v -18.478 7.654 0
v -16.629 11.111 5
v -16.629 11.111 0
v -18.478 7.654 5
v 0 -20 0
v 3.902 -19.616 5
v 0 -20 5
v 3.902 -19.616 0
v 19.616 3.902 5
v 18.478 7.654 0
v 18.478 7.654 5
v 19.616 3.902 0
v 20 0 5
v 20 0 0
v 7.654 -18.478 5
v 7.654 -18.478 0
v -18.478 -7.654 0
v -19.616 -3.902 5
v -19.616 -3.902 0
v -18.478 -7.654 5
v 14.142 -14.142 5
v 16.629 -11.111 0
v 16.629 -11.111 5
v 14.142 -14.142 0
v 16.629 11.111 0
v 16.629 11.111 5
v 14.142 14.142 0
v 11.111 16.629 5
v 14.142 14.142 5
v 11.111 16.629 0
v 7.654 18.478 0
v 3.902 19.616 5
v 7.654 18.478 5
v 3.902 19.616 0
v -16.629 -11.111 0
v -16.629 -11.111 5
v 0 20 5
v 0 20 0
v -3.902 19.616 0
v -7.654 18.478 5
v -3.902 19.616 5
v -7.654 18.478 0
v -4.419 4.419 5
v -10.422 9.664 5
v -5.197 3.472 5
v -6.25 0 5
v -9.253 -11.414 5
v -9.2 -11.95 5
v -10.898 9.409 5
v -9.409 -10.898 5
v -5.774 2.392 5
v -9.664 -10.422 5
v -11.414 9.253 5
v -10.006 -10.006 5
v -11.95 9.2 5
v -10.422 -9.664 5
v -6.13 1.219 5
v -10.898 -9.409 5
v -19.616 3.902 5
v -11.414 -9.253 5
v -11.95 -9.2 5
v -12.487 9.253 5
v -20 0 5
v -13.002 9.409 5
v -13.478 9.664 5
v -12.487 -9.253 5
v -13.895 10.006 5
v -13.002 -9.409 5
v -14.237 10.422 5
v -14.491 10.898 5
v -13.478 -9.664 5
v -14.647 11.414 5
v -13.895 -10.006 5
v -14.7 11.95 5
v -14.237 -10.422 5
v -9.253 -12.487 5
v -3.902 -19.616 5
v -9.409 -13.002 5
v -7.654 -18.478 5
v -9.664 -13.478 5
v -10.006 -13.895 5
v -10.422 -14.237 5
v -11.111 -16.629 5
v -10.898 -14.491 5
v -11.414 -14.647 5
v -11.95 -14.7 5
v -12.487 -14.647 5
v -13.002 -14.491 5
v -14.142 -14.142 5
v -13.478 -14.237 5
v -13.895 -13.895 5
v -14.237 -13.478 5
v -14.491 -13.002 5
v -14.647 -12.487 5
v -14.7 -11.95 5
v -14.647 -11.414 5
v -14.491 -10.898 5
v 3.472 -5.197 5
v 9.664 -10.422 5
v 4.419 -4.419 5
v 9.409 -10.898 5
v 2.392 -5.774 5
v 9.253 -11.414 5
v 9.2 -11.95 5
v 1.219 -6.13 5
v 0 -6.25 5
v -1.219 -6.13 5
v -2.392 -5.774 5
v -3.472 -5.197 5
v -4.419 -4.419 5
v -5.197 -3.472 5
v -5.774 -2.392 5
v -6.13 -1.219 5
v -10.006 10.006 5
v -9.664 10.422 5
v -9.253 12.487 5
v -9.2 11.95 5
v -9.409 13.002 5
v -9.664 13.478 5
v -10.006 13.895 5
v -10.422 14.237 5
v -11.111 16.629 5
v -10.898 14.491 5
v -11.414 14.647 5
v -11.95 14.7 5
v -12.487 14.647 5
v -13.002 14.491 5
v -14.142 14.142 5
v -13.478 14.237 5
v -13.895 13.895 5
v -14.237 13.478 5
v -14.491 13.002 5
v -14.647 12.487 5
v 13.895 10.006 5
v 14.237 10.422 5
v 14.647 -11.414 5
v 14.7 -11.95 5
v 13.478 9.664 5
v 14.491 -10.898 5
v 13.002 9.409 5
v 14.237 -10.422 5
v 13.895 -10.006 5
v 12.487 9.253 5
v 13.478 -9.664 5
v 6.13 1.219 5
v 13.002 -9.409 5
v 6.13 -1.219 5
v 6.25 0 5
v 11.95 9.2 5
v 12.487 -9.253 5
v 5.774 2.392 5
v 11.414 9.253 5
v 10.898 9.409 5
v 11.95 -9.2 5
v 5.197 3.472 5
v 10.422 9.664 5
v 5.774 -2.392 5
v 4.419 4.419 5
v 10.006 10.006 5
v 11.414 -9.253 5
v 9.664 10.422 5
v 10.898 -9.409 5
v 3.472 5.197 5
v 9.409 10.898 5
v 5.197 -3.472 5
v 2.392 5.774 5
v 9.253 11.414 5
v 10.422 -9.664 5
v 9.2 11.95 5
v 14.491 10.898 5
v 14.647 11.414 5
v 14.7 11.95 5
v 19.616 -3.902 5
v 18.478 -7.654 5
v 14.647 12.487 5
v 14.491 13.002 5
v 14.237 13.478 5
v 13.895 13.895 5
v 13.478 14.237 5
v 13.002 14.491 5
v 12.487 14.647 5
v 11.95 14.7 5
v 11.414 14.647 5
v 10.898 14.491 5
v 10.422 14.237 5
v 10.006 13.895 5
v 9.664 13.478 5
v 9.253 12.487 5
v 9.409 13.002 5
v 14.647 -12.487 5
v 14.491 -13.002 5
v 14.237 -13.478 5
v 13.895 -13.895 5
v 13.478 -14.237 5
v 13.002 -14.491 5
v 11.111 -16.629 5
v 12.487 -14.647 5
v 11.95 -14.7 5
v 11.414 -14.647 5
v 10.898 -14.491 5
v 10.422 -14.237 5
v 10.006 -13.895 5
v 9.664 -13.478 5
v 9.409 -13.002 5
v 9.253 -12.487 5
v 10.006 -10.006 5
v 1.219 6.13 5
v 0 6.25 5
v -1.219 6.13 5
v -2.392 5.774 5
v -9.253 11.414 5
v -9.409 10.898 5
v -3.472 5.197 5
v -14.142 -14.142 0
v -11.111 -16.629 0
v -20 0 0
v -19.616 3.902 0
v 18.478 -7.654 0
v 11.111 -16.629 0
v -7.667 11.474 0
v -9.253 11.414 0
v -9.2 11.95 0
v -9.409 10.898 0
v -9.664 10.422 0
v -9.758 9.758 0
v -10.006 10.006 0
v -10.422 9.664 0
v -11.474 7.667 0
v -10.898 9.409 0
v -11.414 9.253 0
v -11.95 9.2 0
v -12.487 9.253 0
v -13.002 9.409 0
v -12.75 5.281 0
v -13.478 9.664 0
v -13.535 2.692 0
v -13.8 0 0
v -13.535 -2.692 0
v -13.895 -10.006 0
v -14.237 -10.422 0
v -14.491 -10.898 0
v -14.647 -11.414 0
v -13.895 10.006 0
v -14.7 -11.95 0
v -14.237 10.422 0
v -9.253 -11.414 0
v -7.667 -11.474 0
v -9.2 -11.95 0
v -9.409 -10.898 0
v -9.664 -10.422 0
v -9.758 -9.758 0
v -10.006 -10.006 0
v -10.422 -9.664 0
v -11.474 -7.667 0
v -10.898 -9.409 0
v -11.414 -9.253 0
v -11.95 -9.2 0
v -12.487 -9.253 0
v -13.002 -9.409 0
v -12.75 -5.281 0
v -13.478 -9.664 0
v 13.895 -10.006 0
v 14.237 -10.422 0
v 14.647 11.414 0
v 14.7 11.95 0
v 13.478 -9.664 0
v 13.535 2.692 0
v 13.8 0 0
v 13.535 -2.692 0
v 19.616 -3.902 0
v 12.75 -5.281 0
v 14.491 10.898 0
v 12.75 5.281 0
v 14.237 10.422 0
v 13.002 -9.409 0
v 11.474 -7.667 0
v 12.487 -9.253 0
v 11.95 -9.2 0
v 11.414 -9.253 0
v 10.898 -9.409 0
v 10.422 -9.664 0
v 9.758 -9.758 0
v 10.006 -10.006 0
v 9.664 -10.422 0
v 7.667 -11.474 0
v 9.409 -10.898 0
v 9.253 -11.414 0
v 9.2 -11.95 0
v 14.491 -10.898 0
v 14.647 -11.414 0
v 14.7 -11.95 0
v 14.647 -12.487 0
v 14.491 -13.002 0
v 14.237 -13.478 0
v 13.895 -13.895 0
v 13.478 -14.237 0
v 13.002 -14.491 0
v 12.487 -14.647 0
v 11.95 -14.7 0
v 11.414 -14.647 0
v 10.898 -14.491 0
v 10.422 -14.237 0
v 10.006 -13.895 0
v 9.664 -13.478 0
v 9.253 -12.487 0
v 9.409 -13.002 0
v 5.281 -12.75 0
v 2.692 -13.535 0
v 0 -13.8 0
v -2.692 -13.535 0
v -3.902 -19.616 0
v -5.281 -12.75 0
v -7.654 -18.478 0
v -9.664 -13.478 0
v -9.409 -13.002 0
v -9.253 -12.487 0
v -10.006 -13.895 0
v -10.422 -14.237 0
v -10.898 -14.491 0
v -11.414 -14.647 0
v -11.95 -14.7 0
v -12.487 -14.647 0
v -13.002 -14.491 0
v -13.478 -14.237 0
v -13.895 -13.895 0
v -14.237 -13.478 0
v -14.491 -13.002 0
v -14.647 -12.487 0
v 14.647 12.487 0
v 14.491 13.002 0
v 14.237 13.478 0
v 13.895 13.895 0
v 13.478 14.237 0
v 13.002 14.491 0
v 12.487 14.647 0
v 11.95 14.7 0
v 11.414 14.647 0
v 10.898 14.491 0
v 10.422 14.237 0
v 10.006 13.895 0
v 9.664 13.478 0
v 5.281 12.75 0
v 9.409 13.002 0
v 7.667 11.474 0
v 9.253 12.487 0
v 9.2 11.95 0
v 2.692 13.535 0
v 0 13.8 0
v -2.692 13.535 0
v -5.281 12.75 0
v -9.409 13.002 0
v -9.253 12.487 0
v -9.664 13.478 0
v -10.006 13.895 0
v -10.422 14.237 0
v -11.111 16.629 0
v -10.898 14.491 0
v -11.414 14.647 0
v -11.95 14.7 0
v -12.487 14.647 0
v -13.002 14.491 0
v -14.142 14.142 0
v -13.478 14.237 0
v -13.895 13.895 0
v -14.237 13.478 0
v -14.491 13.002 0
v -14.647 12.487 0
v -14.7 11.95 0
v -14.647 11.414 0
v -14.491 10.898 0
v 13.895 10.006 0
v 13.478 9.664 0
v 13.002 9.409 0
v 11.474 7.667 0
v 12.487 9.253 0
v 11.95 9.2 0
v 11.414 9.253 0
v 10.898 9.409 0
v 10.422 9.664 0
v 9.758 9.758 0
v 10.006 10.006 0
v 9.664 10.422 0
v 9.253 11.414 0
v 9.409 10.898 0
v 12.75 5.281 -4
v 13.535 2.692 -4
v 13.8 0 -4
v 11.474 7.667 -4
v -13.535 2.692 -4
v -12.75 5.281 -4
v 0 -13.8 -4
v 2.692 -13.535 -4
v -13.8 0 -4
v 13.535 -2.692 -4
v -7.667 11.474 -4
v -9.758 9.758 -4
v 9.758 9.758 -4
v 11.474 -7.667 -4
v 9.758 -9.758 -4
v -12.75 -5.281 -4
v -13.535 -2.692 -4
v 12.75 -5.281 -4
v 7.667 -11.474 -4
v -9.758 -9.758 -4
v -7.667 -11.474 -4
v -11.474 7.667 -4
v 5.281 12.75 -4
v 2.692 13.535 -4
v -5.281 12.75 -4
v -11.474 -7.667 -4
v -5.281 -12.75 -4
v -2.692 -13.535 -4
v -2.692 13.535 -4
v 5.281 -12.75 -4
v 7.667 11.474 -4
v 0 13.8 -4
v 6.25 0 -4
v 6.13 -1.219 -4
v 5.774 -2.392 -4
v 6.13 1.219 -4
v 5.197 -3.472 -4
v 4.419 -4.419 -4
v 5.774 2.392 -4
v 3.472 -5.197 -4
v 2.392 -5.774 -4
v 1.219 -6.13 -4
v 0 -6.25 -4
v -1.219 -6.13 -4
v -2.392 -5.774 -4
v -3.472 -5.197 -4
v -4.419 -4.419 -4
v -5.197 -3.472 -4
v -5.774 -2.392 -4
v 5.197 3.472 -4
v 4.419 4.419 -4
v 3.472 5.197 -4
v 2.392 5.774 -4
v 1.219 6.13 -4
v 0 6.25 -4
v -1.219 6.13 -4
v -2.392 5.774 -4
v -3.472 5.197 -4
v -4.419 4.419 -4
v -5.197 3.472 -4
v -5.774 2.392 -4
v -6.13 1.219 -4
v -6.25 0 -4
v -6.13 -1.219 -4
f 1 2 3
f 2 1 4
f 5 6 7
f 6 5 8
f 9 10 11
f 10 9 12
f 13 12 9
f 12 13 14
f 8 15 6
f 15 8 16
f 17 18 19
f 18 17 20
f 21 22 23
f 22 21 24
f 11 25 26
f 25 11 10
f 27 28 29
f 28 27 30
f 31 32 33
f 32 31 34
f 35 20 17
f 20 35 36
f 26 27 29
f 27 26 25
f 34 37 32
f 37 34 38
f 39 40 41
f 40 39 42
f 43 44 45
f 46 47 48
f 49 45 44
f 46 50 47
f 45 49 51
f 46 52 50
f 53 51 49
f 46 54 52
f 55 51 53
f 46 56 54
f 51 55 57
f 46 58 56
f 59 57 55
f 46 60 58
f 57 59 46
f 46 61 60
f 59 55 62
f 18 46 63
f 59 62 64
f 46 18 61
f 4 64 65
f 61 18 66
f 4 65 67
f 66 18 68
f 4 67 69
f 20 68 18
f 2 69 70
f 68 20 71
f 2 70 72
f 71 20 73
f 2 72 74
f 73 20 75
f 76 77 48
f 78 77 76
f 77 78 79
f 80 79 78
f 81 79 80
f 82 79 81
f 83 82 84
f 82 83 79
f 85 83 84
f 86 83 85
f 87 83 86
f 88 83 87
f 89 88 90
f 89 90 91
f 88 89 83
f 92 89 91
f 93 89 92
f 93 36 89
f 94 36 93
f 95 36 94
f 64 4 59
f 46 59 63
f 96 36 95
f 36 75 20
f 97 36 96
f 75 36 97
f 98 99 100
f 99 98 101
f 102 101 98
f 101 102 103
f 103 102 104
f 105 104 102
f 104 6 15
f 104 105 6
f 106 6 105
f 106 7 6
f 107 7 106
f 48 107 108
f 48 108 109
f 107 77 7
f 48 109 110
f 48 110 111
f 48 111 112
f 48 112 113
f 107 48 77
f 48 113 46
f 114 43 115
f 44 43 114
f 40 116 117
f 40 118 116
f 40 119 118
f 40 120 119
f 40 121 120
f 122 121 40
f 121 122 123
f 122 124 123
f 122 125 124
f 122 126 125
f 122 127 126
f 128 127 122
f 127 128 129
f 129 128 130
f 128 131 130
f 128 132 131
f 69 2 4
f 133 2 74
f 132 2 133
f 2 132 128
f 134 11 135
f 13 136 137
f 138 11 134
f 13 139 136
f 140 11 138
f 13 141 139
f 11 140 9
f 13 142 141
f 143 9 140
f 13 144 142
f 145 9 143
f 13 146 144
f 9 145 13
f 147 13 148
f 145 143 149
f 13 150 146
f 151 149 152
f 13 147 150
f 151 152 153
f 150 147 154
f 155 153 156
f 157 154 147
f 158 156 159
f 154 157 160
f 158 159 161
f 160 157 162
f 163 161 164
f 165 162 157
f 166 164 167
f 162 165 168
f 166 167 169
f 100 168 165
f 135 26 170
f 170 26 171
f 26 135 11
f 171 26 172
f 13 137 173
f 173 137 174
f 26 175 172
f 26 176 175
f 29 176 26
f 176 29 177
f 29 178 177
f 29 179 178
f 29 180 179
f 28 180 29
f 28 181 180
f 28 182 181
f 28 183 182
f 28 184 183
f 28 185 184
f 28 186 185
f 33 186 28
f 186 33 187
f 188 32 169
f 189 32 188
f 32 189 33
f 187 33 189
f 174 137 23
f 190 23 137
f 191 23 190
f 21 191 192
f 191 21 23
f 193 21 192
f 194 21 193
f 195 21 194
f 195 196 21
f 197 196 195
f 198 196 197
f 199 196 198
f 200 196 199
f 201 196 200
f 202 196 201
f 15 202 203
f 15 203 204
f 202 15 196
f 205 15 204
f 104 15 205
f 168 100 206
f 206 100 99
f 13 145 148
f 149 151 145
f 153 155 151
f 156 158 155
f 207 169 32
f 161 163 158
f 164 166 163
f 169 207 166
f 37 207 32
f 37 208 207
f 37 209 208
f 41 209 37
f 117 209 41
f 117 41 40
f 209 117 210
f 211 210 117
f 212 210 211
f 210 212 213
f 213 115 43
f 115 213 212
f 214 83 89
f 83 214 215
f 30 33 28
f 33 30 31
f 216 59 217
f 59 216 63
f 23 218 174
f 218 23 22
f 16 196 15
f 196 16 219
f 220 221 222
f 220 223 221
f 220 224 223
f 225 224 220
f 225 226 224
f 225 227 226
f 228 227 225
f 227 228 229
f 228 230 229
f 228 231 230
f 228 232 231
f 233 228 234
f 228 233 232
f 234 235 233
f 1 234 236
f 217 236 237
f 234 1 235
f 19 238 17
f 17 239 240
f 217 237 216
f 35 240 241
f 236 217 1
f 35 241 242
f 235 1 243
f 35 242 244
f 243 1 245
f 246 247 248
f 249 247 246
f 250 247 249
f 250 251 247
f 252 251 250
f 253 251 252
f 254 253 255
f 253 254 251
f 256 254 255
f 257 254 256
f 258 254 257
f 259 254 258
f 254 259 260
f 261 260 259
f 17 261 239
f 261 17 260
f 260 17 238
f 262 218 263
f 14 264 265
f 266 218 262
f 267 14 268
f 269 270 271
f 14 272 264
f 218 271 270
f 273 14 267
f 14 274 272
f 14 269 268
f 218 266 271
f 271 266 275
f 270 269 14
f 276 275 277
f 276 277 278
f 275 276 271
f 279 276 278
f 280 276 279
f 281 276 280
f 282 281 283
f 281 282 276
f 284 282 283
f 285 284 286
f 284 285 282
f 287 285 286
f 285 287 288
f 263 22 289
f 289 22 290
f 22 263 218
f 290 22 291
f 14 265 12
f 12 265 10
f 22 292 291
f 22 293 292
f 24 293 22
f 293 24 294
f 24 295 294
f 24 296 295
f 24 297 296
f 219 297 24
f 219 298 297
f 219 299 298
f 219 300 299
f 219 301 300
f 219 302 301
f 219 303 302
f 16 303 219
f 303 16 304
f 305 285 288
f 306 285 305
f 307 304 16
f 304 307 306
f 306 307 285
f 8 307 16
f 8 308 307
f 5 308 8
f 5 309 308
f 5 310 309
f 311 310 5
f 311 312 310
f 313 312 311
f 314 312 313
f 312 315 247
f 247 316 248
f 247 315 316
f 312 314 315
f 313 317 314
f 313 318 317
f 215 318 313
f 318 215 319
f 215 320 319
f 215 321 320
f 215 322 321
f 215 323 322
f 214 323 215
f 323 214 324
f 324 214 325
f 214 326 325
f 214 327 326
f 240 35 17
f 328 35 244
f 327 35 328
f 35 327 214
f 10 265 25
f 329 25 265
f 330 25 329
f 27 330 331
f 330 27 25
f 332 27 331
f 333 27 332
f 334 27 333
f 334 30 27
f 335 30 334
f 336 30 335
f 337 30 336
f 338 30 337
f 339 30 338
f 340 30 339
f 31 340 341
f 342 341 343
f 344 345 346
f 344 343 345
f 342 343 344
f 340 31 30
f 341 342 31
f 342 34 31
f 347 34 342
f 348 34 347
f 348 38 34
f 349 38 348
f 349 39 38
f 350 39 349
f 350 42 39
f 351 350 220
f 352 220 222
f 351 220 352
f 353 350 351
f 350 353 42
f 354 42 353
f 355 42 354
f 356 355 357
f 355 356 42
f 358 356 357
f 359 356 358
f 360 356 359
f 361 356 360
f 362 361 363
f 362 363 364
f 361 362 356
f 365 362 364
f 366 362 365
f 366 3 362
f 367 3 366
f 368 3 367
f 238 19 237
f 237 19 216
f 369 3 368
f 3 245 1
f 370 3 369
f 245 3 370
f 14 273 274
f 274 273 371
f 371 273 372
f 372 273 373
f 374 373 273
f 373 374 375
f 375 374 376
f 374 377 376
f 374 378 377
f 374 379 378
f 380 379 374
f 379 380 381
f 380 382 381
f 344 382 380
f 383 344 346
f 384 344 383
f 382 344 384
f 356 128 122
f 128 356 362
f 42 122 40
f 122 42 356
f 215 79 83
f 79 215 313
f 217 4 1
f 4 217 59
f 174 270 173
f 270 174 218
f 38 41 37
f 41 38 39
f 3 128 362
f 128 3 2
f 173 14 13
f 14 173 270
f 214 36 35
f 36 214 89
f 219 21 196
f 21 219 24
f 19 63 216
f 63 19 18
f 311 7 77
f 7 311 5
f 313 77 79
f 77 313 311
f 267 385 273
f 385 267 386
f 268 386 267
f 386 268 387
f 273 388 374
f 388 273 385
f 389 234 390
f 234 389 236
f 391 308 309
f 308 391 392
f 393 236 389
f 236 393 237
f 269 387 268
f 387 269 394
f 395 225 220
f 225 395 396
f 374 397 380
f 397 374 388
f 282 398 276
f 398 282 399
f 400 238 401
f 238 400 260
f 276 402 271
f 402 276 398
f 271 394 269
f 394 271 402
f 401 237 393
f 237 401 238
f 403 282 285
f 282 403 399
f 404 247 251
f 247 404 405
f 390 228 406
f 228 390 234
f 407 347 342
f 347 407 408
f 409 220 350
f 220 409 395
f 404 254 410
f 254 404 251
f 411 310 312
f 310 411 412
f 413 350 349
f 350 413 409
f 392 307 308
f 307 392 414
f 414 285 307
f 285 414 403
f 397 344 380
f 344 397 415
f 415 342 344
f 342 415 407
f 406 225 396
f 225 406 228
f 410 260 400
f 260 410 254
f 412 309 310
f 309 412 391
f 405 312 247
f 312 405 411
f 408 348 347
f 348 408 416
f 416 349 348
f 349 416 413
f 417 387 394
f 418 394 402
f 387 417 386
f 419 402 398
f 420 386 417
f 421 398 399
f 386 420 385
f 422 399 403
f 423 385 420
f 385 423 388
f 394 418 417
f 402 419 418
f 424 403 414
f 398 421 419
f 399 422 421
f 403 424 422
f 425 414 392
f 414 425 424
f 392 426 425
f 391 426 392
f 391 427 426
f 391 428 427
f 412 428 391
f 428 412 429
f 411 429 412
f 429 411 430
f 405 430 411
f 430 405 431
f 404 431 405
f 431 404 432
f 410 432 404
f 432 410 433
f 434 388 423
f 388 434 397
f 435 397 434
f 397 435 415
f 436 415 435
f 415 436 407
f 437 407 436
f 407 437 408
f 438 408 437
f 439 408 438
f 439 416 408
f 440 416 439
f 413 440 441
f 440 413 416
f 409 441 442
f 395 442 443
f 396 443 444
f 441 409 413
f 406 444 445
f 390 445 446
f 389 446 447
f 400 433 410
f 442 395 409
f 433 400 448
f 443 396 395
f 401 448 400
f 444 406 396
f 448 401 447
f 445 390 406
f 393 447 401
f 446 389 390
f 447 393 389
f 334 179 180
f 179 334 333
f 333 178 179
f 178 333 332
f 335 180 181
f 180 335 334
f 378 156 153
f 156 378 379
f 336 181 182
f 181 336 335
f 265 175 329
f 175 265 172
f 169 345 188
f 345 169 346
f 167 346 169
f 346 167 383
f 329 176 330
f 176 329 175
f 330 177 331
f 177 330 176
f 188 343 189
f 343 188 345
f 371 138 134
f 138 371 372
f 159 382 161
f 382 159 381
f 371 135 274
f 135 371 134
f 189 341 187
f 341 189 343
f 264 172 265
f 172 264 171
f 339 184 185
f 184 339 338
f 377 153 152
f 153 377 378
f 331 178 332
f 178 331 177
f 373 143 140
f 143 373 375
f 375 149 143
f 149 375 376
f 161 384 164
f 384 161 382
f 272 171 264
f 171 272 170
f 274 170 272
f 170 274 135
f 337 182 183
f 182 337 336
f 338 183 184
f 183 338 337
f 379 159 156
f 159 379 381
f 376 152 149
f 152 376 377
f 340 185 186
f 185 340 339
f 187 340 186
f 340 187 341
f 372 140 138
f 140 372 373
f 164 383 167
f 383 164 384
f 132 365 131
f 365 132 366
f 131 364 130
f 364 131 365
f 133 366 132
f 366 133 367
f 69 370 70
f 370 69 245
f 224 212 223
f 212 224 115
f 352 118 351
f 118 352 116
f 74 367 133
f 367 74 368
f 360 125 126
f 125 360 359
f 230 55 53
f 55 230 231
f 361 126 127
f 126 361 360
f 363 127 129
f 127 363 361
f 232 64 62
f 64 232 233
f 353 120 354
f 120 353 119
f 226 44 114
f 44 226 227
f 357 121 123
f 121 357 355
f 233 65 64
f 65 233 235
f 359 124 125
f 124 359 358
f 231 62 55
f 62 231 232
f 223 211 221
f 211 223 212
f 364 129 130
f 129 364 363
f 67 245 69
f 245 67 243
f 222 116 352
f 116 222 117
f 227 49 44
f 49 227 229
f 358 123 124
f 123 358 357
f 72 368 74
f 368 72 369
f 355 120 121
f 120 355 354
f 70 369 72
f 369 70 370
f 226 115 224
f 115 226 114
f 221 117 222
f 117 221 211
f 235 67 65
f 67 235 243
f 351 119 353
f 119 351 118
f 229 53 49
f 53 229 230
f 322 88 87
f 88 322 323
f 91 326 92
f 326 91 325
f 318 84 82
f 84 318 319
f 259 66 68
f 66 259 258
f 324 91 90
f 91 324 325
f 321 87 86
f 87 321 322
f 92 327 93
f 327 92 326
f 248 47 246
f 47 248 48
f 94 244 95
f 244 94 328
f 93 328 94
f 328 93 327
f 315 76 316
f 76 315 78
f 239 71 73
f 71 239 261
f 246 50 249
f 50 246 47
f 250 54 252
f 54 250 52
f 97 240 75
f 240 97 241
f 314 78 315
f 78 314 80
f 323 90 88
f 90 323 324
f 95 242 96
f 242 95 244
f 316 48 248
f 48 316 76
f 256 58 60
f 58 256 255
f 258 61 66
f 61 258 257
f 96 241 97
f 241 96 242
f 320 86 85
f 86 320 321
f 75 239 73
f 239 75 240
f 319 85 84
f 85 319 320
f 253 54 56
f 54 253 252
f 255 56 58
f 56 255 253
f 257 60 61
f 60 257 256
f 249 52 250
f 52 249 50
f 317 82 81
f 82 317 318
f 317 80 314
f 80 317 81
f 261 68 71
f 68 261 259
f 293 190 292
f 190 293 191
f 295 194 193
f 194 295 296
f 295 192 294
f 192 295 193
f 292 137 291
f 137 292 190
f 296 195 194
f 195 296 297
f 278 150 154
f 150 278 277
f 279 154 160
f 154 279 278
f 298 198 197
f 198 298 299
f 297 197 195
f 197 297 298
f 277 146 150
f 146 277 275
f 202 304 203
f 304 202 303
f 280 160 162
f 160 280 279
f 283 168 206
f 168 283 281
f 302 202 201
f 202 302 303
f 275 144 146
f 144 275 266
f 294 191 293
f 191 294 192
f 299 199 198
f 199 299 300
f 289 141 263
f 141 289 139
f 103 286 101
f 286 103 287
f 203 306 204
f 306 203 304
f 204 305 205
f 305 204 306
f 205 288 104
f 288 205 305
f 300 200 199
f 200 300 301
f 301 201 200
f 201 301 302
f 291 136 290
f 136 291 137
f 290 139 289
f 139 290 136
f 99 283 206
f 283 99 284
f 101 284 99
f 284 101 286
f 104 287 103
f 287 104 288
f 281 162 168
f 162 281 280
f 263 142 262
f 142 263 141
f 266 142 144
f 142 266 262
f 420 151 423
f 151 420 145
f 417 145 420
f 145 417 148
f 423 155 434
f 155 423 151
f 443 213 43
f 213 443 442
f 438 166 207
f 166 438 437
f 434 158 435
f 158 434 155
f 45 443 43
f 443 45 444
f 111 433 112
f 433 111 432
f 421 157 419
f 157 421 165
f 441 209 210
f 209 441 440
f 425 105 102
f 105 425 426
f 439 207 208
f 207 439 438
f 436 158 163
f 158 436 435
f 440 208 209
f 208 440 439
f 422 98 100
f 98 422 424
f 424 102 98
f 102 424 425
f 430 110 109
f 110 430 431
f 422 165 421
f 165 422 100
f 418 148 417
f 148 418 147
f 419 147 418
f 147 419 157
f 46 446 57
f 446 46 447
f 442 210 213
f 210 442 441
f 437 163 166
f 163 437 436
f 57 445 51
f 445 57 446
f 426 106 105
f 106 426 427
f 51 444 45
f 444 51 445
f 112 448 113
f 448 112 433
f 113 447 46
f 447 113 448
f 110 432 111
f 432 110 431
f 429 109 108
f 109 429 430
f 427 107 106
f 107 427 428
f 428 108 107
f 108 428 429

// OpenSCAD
$fn = 32;

// ----------------------------------------------------------------------
// Retaining cap: 6001 cover, 40 mm, spigot 27.6 mm
// ----------------------------------------------------------------------

// --- parameters (mm) ---
plate_d = 40;             // cover diameter
plate_t = 5;              // cover thickness
boss_d = 27.6;            // spigot that enters the housing
boss_h = 4;               // spigot height
shaft_d = 12.5;           // shaft opening
bolt_d = 5.5;             // bolt clearance
bolt_r = 16.9;            // bolt circle radius

module cover() {
  cylinder(h = plate_t, d = plate_d);
}

module spigot() {
  /* sunk 1 mm into the cover; the spigot sets the overall height */
  translate([0, 0, -boss_h]) cylinder(h = boss_h + 1, d = boss_d);
}

difference() {
  union() {
    cover();
    spigot();
  }
  for (i = [0 : 3]) rotate([0, 0, 45 + i * 90]) translate([bolt_r, 0, -boss_h - 1])
    cylinder(h = boss_h + plate_t + 2, d = bolt_d);
  translate([0, 0, -boss_h - 1]) cylinder(h = boss_h + plate_t + 2, d = shaft_d);
}
